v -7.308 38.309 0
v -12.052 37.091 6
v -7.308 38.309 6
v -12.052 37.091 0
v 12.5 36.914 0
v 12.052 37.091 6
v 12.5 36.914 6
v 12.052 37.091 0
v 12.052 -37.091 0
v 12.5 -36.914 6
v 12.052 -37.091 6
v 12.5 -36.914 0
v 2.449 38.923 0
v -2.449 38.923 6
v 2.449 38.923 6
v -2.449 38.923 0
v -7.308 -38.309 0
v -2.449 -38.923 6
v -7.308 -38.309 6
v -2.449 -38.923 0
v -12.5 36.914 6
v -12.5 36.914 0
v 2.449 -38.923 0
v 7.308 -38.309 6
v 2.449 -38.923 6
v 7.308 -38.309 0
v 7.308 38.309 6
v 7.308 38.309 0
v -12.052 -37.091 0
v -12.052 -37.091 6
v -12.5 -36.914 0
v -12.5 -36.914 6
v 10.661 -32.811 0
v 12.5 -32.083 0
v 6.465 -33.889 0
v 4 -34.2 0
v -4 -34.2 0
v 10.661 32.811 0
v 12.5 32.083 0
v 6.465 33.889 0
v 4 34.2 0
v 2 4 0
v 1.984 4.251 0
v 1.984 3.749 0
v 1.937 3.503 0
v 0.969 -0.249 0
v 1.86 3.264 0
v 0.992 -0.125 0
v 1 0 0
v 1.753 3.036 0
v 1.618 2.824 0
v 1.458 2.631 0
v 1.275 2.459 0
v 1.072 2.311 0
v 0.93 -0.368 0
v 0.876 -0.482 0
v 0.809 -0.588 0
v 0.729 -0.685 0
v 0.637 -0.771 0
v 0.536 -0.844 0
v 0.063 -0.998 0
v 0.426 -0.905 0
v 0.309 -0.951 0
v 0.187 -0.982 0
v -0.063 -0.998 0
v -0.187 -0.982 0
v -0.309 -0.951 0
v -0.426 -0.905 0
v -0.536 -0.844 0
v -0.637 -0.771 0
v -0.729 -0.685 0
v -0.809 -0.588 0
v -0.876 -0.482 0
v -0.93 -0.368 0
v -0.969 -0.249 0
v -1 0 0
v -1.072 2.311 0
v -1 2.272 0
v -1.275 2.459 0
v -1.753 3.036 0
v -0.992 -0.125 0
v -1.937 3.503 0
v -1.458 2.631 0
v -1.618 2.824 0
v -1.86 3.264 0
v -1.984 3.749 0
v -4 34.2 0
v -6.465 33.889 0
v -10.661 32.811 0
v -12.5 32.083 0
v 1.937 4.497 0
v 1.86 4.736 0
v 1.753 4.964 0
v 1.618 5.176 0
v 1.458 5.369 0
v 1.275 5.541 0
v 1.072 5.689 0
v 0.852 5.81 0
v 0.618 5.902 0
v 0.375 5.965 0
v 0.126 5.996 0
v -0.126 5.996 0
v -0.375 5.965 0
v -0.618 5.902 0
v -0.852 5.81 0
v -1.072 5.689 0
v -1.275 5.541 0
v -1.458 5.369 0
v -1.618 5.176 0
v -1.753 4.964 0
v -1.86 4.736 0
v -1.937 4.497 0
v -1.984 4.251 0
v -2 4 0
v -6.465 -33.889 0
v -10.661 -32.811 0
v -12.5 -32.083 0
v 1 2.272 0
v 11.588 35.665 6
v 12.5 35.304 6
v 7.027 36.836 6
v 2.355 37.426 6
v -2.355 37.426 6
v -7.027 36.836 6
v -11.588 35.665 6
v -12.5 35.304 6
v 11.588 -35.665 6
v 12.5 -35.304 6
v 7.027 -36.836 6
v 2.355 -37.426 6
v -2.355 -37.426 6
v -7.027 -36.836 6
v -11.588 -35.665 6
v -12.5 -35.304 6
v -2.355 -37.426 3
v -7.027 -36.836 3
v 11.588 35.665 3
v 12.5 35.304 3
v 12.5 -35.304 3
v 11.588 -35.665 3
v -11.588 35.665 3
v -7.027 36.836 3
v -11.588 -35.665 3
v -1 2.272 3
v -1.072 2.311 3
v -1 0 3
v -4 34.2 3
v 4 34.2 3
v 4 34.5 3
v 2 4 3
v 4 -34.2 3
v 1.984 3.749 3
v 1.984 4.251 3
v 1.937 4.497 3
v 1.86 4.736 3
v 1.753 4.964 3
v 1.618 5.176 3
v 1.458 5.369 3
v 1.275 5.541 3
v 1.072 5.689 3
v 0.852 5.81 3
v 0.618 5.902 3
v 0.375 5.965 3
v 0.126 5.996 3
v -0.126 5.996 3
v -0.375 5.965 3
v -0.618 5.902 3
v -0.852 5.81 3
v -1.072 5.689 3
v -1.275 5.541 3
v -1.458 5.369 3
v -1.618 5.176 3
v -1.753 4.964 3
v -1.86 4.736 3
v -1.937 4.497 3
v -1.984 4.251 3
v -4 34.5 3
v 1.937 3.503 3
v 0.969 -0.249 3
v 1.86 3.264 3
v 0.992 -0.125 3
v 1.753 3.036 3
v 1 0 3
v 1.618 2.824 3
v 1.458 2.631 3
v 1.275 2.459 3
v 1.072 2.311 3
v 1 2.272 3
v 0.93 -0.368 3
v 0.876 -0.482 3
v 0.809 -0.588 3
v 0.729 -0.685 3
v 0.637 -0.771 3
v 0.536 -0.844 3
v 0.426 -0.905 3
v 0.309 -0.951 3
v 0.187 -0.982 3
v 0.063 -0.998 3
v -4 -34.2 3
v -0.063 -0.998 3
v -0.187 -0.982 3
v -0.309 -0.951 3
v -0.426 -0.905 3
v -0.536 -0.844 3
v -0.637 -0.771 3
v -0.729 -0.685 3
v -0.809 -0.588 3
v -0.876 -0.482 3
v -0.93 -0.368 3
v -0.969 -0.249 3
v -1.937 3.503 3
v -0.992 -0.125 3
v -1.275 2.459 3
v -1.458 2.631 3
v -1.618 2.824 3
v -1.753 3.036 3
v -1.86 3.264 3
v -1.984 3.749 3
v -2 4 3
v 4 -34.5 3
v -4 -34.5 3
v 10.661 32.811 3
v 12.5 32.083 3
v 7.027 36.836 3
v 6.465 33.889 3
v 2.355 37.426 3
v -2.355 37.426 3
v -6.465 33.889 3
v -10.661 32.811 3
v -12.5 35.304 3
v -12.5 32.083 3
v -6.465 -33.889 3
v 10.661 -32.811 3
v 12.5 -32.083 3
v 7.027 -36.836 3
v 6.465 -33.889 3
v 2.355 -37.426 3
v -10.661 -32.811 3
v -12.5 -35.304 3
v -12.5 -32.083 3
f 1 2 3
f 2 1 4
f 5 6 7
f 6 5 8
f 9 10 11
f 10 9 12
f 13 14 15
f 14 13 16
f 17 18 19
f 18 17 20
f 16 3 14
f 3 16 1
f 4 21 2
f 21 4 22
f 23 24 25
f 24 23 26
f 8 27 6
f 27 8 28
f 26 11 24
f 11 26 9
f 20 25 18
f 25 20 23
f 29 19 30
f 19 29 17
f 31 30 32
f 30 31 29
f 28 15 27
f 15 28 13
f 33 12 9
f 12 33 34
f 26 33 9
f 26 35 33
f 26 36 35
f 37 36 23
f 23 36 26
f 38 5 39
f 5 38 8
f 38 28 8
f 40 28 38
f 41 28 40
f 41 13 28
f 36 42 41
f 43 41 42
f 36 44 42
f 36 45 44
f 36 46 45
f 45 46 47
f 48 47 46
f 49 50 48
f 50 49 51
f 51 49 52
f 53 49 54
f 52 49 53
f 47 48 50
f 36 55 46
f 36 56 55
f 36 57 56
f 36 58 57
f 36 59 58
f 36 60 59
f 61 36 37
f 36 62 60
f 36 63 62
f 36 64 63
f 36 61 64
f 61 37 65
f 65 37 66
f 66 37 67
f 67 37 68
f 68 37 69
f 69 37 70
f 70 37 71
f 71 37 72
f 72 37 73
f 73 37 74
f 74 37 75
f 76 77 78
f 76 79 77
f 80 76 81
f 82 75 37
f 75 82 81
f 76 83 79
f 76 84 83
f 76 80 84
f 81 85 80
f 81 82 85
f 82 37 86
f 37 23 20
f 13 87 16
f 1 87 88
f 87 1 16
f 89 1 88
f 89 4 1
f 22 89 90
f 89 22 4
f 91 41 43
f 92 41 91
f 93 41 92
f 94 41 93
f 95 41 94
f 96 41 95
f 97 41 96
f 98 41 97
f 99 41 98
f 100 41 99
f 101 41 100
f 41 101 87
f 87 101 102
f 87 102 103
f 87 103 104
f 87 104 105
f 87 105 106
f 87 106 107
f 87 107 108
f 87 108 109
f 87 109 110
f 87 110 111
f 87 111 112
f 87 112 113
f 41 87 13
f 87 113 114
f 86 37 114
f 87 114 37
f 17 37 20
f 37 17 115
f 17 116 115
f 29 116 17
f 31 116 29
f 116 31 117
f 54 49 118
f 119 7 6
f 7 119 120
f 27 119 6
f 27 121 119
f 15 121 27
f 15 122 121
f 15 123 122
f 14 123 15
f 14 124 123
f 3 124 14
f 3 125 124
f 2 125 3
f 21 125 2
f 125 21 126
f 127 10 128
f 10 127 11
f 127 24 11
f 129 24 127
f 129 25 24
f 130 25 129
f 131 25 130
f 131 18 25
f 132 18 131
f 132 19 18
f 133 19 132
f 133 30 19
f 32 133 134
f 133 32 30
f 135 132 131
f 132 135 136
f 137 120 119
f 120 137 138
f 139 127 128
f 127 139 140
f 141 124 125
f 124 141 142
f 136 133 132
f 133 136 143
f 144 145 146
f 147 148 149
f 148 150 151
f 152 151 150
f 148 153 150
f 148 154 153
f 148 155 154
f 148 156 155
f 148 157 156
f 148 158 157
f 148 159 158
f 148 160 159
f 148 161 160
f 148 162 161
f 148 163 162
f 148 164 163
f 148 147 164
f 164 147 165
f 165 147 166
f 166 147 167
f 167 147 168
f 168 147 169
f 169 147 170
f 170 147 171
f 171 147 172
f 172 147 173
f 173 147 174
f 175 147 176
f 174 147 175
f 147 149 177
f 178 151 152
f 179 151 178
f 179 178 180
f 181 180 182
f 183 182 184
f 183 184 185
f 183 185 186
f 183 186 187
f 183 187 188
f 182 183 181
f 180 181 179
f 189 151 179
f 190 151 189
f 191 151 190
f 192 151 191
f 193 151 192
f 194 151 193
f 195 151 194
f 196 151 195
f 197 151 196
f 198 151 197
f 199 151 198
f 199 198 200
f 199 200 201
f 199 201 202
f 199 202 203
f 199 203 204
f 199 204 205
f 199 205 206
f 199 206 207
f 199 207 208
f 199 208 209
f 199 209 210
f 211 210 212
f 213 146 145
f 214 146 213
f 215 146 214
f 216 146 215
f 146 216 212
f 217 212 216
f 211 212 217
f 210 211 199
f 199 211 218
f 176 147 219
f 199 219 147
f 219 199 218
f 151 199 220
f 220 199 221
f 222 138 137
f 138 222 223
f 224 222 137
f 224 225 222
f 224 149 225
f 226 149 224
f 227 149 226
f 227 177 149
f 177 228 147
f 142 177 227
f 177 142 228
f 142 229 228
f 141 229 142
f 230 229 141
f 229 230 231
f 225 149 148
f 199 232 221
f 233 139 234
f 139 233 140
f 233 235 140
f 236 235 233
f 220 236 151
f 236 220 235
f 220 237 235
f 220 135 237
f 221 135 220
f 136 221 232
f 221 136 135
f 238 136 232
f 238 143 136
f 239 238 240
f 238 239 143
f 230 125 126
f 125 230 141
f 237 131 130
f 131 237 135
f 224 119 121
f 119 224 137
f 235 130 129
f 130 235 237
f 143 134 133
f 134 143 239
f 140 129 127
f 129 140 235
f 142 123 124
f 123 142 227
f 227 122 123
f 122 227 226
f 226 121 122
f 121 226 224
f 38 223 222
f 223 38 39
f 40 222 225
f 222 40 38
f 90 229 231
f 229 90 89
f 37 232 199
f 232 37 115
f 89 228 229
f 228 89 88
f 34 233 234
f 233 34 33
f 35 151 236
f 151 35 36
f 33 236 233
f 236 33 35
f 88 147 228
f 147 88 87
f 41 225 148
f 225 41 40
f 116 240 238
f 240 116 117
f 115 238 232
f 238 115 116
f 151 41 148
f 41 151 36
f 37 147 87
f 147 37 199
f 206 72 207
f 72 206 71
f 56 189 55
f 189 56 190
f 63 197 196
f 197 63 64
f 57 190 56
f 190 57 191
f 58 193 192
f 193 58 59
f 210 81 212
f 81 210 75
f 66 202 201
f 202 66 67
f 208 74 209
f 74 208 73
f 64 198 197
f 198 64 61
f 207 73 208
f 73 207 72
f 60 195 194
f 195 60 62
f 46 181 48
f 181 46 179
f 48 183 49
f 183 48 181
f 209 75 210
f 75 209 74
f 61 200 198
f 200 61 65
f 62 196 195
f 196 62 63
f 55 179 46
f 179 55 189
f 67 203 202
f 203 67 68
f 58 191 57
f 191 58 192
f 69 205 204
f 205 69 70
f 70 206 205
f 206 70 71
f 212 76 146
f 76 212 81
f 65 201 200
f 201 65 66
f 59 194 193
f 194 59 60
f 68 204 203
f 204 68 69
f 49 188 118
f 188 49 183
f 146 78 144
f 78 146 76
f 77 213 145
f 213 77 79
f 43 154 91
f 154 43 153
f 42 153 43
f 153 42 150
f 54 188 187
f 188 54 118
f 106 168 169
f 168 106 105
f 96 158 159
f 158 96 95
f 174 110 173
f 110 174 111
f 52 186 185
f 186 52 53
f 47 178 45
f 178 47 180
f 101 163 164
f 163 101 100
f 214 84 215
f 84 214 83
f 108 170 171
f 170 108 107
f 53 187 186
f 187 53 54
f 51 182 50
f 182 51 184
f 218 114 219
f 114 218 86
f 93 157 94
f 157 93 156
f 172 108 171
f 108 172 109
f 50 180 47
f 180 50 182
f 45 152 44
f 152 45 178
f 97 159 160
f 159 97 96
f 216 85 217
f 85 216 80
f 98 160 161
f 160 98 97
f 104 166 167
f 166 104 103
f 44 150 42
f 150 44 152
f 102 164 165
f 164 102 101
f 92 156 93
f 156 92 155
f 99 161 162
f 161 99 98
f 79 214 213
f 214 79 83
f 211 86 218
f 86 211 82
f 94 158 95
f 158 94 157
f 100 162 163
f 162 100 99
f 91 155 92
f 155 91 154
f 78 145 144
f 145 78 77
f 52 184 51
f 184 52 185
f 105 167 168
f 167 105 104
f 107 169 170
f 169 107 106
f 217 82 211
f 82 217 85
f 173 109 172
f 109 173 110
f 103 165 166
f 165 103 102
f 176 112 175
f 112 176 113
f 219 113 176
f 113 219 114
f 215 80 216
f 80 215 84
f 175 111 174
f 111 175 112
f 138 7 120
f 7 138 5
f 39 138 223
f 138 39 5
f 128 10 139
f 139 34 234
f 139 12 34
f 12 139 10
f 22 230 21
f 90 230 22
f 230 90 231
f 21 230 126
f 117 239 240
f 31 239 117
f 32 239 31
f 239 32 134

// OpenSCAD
outdiameter = 75;
thickness = 3;
rimthickness = 6;

wickDiam = 2;
middleWidth = 8;
wickOpenningLength = 4;

$fn=50;


difference() {
    union() {
        difference() {
            cylinder(d=outdiameter + thickness,h=rimthickness);

            translate([0, 0, thickness]) cylinder(d=outdiameter,h=(rimthickness - thickness));

            cylinder(d=outdiameter - rimthickness,h=thickness);
        }

        difference() {
            translate([-middleWidth /2, -(outdiameter - rimthickness) / 2, 0]) cube([middleWidth, outdiameter - rimthickness, thickness]);

            cylinder(d=wickDiam,h=thickness);

            translate([-wickDiam / 2, 0, 0]) {
                cube([wickDiam, wickOpenningLength, thickness]);
            }
            
            translate([0, wickOpenningLength, 0]) cylinder(d=wickDiam +2,h=thickness);
        }
    }

    translate([outdiameter / 6, -(outdiameter + rimthickness) / 2, 0])  cube([outdiameter + rimthickness, outdiameter + rimthickness, rimthickness]);
    translate([-(outdiameter / 6 + outdiameter + rimthickness), -(outdiameter + rimthickness) / 2, 0])  cube([outdiameter + rimthickness, outdiameter + rimthickness, rimthickness]);
}
